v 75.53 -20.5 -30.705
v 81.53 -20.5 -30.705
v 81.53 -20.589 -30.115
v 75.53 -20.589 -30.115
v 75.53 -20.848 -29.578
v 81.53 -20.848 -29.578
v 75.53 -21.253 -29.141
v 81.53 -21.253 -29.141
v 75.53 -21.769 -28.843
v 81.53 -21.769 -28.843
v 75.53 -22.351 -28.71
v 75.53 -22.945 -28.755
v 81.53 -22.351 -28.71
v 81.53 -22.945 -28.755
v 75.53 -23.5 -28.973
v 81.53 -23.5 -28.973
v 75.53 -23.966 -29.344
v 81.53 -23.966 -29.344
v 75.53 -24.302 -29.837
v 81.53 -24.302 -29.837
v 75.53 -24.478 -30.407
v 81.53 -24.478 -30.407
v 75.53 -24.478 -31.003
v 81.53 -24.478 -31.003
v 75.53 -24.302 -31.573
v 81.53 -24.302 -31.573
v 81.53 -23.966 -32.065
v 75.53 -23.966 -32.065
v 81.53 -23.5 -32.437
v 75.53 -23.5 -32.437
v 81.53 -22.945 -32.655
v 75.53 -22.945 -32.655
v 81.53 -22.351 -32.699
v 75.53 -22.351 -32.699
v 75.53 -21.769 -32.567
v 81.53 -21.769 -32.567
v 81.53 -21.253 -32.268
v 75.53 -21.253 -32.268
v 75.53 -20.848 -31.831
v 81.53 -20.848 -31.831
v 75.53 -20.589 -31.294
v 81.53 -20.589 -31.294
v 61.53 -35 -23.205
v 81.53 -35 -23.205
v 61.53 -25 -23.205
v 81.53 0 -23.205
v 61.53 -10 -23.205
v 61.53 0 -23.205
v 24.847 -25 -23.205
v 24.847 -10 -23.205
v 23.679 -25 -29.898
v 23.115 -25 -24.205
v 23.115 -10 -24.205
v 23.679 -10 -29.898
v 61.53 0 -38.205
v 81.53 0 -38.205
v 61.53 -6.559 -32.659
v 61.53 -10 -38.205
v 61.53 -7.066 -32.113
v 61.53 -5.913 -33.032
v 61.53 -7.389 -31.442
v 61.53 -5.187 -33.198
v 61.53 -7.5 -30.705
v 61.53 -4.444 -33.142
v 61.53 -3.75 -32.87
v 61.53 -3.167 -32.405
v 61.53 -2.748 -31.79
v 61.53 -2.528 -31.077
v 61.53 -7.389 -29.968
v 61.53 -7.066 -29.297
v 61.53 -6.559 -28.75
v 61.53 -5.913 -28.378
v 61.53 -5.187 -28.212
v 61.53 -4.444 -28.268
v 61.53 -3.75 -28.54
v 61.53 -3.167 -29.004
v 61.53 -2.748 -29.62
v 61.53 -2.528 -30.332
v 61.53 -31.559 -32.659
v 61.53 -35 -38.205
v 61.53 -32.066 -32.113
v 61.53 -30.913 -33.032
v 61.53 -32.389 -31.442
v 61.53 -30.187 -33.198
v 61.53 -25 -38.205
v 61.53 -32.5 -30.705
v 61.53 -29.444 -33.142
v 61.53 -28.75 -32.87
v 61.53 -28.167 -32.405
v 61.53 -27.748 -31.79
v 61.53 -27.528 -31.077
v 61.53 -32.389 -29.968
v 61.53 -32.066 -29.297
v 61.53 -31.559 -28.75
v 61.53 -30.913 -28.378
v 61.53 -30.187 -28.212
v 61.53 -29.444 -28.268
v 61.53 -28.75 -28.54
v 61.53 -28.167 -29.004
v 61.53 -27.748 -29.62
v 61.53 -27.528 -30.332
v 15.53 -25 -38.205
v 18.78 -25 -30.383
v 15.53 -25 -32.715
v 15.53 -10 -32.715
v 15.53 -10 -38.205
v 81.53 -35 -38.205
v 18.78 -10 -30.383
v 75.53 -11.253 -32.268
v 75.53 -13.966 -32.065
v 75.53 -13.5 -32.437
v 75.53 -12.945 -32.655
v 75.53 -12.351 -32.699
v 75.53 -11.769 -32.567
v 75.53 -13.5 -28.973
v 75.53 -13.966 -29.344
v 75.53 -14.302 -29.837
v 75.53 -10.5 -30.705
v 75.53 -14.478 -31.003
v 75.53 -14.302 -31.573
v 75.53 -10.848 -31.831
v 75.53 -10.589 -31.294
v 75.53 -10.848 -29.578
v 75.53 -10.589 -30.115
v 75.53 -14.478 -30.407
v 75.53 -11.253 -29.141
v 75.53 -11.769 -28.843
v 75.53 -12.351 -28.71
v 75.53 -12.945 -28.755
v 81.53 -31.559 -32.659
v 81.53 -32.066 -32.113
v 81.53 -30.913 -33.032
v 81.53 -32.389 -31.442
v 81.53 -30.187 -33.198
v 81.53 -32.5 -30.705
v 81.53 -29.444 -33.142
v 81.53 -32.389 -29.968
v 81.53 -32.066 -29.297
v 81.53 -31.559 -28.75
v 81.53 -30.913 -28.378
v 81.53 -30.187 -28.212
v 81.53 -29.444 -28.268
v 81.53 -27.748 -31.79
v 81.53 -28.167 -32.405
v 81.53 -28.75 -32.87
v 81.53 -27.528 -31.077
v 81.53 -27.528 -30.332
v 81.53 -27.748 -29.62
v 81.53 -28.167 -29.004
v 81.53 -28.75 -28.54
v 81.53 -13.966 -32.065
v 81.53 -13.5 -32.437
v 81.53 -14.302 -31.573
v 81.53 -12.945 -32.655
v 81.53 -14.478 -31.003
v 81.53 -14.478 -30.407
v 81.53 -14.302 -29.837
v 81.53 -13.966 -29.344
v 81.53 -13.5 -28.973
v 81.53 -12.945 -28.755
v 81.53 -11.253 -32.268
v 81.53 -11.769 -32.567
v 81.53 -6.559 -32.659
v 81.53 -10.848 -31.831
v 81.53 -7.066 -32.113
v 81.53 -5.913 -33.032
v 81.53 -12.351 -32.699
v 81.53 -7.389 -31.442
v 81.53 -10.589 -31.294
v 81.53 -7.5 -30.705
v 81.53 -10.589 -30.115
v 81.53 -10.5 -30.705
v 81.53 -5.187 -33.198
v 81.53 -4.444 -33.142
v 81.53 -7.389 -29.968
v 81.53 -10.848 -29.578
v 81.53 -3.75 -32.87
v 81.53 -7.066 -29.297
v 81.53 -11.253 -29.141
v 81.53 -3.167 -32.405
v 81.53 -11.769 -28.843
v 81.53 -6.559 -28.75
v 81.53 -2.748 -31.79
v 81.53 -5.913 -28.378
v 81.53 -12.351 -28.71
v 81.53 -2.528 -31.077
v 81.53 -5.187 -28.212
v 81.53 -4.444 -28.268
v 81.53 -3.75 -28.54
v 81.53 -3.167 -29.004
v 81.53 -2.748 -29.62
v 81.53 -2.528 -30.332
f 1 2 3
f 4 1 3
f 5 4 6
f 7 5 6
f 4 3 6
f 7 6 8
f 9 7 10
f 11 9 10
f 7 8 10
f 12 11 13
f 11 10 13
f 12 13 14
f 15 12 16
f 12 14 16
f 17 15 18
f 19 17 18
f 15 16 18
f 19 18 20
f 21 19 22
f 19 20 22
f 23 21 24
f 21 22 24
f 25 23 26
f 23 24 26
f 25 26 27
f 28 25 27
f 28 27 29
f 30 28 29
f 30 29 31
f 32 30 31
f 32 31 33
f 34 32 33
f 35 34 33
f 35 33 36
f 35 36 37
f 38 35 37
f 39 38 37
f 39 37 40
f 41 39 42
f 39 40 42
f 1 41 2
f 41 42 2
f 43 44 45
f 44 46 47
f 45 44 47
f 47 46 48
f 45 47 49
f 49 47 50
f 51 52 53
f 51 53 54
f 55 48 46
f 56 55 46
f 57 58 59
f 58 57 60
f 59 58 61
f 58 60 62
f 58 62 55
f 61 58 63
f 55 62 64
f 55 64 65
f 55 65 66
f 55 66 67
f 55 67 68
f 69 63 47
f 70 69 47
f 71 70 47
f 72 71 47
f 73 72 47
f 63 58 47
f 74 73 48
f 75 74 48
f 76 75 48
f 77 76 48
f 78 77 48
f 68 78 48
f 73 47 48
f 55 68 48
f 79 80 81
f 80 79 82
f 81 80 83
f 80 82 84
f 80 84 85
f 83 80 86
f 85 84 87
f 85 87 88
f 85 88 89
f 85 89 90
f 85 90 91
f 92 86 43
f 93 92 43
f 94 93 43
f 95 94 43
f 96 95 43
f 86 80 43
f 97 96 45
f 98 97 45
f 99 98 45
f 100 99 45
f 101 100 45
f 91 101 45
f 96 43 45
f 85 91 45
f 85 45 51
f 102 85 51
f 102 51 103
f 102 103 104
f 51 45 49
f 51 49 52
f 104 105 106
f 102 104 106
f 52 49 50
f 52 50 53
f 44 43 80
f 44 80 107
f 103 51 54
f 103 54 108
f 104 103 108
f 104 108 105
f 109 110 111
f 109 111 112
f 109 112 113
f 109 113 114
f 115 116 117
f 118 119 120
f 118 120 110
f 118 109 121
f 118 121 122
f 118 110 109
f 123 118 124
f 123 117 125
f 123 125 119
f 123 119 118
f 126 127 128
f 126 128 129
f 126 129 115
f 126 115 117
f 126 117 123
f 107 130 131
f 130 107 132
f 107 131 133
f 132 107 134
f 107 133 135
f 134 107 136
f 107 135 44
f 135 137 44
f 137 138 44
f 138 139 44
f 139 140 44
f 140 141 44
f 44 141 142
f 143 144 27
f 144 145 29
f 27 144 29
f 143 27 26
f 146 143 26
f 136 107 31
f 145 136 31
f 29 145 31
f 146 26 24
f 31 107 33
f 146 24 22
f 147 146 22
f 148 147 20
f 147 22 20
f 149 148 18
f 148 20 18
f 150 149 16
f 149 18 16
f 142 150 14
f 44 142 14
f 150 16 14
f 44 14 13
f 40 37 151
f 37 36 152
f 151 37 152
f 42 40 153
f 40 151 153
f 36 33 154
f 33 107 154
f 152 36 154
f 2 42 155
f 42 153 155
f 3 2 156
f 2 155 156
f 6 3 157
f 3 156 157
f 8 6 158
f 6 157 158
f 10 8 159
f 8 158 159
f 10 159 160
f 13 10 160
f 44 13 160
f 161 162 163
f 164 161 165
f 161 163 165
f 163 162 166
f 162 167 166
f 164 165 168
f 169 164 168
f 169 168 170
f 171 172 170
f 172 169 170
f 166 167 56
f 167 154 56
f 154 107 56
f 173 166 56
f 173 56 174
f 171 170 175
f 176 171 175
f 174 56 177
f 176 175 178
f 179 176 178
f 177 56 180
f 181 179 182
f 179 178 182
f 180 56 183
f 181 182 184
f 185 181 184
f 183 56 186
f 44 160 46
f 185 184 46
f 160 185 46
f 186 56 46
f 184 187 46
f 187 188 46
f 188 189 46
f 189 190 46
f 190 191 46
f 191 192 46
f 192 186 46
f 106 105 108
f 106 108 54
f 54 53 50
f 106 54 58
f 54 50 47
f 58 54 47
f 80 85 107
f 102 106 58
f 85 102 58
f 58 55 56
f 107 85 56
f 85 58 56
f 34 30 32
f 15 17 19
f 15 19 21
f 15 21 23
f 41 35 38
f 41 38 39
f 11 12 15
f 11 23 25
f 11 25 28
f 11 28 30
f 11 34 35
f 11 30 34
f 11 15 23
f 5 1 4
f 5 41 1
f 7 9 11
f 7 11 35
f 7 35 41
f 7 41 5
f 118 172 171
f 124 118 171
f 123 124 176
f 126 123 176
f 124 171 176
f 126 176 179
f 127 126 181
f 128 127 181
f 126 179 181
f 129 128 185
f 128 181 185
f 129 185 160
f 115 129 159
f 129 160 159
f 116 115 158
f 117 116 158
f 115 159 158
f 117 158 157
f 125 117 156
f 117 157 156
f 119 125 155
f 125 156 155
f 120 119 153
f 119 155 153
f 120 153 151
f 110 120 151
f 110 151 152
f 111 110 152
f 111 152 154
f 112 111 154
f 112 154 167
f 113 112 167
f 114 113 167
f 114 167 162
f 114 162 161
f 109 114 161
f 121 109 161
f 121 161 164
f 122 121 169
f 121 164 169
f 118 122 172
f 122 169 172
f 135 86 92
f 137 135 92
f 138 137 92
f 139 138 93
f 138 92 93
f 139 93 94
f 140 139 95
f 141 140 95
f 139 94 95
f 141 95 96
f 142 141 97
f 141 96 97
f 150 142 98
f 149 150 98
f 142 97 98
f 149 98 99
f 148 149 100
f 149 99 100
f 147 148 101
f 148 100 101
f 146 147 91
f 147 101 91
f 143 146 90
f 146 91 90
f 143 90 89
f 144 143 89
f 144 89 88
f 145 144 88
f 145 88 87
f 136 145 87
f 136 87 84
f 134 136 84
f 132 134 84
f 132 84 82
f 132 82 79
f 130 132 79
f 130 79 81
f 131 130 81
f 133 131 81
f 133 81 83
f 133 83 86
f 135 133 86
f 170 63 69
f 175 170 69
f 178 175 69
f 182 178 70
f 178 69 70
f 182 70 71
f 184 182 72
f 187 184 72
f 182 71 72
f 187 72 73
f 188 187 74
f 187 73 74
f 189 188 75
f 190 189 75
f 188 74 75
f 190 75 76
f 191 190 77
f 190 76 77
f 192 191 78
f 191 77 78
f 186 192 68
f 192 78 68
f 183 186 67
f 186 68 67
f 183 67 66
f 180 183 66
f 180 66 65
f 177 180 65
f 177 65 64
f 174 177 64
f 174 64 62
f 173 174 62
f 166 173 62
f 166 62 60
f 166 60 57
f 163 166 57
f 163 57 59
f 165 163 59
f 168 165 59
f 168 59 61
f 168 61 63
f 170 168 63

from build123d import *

# Parameters (mm, degrees)
F0_W      = 20
F0_H      = 7.5
F1_DEPTH  = 35
F2_W      = 36.682897
F2_H      = 10
F3_DEPTH  = 15.001
F4_R      = 2.5
F5_DEPTH  = 20.001
F7_W      = 23.5301591456
F7_H      = 12.1317058802
F8_DEPTH  = 25
F6_R      = 2
F11_DEPTH = 6


with BuildPart() as f1:
    # F0 (on Front) → F1 (new body)
    with BuildSketch(Plane.XZ):
        Polygon((61.530317, -30.704832), (61.530317, -23.204832), (24.84742, -23.204832), (23.115369, -24.204832), (23.679145, -29.89786), (18.780462, -30.382973), (15.530317, -32.714615), (15.530317, -38.204832), (61.530317, -38.204832), align=None)
        with Locations((71.530317, -26.954832)):
            Rectangle(F0_W, F0_H)
        with Locations((71.530317, -34.454832)):
            Rectangle(F0_W, F0_H)
    extrude(amount=F1_DEPTH)

    # F2 (on face) → F3 (cut, through all)
    with BuildSketch(Plane.XY.offset(-23.204832)):
        with Locations((43.1888685, -5)):
            Rectangle(F2_W, F2_H)
        Polygon((24.84742, -10), (24.84742, 0), (23.679145, 0), (23.115369, 0), (18.780462, 0), (15.530317, 0), (15.530317, -10), (18.780462, -10), (23.115369, -10), (23.679145, -10), align=None)
        with Locations((43.1888685, -30)):
            Rectangle(F2_W, F2_H)
        Polygon((24.84742, -35), (24.84742, -25), (23.679145, -25), (23.115369, -25), (18.780462, -25), (15.530317, -25), (15.530317, -35), (18.780462, -35), (23.115369, -35), (23.679145, -35), align=None)
    extrude(amount=-F3_DEPTH, mode=Mode.SUBTRACT)

    # F4 (on face) → F5 (cut, through all)
    with BuildSketch(Plane(origin=(61.530317, 0, 0), x_dir=(0, -1, 0), z_dir=(-1, 0, 0))):
        with Locations((30, -30.704832)):
            Circle(F4_R)
        with Locations((5, -30.704832)):
            Circle(F4_R)
    extrude(amount=-F5_DEPTH, mode=Mode.SUBTRACT)

    # F6 (on face) → F11 (cut)
    with BuildSketch(Plane.YZ.offset(81.530317)):
        with Locations((-12.5, -30.704832)):
            Circle(F6_R)
        with Locations((-22.5, -30.704832)):
            Circle(F6_R)
    extrude(amount=-F11_DEPTH, mode=Mode.SUBTRACT)


with BuildPart() as f8:
    # F7 (on Right) → F8 (new body)
    with BuildSketch(Plane.YZ):
        with Locations((-54.0060605854, 53.4663982689)):
            Rectangle(F7_W, F7_H)
    extrude(amount=F8_DEPTH)


with BuildPart() as f9_1:
    # F9: copy of F8
    add(f8.part.moved(Location((0, -65, 0))))


solid = f1.part
